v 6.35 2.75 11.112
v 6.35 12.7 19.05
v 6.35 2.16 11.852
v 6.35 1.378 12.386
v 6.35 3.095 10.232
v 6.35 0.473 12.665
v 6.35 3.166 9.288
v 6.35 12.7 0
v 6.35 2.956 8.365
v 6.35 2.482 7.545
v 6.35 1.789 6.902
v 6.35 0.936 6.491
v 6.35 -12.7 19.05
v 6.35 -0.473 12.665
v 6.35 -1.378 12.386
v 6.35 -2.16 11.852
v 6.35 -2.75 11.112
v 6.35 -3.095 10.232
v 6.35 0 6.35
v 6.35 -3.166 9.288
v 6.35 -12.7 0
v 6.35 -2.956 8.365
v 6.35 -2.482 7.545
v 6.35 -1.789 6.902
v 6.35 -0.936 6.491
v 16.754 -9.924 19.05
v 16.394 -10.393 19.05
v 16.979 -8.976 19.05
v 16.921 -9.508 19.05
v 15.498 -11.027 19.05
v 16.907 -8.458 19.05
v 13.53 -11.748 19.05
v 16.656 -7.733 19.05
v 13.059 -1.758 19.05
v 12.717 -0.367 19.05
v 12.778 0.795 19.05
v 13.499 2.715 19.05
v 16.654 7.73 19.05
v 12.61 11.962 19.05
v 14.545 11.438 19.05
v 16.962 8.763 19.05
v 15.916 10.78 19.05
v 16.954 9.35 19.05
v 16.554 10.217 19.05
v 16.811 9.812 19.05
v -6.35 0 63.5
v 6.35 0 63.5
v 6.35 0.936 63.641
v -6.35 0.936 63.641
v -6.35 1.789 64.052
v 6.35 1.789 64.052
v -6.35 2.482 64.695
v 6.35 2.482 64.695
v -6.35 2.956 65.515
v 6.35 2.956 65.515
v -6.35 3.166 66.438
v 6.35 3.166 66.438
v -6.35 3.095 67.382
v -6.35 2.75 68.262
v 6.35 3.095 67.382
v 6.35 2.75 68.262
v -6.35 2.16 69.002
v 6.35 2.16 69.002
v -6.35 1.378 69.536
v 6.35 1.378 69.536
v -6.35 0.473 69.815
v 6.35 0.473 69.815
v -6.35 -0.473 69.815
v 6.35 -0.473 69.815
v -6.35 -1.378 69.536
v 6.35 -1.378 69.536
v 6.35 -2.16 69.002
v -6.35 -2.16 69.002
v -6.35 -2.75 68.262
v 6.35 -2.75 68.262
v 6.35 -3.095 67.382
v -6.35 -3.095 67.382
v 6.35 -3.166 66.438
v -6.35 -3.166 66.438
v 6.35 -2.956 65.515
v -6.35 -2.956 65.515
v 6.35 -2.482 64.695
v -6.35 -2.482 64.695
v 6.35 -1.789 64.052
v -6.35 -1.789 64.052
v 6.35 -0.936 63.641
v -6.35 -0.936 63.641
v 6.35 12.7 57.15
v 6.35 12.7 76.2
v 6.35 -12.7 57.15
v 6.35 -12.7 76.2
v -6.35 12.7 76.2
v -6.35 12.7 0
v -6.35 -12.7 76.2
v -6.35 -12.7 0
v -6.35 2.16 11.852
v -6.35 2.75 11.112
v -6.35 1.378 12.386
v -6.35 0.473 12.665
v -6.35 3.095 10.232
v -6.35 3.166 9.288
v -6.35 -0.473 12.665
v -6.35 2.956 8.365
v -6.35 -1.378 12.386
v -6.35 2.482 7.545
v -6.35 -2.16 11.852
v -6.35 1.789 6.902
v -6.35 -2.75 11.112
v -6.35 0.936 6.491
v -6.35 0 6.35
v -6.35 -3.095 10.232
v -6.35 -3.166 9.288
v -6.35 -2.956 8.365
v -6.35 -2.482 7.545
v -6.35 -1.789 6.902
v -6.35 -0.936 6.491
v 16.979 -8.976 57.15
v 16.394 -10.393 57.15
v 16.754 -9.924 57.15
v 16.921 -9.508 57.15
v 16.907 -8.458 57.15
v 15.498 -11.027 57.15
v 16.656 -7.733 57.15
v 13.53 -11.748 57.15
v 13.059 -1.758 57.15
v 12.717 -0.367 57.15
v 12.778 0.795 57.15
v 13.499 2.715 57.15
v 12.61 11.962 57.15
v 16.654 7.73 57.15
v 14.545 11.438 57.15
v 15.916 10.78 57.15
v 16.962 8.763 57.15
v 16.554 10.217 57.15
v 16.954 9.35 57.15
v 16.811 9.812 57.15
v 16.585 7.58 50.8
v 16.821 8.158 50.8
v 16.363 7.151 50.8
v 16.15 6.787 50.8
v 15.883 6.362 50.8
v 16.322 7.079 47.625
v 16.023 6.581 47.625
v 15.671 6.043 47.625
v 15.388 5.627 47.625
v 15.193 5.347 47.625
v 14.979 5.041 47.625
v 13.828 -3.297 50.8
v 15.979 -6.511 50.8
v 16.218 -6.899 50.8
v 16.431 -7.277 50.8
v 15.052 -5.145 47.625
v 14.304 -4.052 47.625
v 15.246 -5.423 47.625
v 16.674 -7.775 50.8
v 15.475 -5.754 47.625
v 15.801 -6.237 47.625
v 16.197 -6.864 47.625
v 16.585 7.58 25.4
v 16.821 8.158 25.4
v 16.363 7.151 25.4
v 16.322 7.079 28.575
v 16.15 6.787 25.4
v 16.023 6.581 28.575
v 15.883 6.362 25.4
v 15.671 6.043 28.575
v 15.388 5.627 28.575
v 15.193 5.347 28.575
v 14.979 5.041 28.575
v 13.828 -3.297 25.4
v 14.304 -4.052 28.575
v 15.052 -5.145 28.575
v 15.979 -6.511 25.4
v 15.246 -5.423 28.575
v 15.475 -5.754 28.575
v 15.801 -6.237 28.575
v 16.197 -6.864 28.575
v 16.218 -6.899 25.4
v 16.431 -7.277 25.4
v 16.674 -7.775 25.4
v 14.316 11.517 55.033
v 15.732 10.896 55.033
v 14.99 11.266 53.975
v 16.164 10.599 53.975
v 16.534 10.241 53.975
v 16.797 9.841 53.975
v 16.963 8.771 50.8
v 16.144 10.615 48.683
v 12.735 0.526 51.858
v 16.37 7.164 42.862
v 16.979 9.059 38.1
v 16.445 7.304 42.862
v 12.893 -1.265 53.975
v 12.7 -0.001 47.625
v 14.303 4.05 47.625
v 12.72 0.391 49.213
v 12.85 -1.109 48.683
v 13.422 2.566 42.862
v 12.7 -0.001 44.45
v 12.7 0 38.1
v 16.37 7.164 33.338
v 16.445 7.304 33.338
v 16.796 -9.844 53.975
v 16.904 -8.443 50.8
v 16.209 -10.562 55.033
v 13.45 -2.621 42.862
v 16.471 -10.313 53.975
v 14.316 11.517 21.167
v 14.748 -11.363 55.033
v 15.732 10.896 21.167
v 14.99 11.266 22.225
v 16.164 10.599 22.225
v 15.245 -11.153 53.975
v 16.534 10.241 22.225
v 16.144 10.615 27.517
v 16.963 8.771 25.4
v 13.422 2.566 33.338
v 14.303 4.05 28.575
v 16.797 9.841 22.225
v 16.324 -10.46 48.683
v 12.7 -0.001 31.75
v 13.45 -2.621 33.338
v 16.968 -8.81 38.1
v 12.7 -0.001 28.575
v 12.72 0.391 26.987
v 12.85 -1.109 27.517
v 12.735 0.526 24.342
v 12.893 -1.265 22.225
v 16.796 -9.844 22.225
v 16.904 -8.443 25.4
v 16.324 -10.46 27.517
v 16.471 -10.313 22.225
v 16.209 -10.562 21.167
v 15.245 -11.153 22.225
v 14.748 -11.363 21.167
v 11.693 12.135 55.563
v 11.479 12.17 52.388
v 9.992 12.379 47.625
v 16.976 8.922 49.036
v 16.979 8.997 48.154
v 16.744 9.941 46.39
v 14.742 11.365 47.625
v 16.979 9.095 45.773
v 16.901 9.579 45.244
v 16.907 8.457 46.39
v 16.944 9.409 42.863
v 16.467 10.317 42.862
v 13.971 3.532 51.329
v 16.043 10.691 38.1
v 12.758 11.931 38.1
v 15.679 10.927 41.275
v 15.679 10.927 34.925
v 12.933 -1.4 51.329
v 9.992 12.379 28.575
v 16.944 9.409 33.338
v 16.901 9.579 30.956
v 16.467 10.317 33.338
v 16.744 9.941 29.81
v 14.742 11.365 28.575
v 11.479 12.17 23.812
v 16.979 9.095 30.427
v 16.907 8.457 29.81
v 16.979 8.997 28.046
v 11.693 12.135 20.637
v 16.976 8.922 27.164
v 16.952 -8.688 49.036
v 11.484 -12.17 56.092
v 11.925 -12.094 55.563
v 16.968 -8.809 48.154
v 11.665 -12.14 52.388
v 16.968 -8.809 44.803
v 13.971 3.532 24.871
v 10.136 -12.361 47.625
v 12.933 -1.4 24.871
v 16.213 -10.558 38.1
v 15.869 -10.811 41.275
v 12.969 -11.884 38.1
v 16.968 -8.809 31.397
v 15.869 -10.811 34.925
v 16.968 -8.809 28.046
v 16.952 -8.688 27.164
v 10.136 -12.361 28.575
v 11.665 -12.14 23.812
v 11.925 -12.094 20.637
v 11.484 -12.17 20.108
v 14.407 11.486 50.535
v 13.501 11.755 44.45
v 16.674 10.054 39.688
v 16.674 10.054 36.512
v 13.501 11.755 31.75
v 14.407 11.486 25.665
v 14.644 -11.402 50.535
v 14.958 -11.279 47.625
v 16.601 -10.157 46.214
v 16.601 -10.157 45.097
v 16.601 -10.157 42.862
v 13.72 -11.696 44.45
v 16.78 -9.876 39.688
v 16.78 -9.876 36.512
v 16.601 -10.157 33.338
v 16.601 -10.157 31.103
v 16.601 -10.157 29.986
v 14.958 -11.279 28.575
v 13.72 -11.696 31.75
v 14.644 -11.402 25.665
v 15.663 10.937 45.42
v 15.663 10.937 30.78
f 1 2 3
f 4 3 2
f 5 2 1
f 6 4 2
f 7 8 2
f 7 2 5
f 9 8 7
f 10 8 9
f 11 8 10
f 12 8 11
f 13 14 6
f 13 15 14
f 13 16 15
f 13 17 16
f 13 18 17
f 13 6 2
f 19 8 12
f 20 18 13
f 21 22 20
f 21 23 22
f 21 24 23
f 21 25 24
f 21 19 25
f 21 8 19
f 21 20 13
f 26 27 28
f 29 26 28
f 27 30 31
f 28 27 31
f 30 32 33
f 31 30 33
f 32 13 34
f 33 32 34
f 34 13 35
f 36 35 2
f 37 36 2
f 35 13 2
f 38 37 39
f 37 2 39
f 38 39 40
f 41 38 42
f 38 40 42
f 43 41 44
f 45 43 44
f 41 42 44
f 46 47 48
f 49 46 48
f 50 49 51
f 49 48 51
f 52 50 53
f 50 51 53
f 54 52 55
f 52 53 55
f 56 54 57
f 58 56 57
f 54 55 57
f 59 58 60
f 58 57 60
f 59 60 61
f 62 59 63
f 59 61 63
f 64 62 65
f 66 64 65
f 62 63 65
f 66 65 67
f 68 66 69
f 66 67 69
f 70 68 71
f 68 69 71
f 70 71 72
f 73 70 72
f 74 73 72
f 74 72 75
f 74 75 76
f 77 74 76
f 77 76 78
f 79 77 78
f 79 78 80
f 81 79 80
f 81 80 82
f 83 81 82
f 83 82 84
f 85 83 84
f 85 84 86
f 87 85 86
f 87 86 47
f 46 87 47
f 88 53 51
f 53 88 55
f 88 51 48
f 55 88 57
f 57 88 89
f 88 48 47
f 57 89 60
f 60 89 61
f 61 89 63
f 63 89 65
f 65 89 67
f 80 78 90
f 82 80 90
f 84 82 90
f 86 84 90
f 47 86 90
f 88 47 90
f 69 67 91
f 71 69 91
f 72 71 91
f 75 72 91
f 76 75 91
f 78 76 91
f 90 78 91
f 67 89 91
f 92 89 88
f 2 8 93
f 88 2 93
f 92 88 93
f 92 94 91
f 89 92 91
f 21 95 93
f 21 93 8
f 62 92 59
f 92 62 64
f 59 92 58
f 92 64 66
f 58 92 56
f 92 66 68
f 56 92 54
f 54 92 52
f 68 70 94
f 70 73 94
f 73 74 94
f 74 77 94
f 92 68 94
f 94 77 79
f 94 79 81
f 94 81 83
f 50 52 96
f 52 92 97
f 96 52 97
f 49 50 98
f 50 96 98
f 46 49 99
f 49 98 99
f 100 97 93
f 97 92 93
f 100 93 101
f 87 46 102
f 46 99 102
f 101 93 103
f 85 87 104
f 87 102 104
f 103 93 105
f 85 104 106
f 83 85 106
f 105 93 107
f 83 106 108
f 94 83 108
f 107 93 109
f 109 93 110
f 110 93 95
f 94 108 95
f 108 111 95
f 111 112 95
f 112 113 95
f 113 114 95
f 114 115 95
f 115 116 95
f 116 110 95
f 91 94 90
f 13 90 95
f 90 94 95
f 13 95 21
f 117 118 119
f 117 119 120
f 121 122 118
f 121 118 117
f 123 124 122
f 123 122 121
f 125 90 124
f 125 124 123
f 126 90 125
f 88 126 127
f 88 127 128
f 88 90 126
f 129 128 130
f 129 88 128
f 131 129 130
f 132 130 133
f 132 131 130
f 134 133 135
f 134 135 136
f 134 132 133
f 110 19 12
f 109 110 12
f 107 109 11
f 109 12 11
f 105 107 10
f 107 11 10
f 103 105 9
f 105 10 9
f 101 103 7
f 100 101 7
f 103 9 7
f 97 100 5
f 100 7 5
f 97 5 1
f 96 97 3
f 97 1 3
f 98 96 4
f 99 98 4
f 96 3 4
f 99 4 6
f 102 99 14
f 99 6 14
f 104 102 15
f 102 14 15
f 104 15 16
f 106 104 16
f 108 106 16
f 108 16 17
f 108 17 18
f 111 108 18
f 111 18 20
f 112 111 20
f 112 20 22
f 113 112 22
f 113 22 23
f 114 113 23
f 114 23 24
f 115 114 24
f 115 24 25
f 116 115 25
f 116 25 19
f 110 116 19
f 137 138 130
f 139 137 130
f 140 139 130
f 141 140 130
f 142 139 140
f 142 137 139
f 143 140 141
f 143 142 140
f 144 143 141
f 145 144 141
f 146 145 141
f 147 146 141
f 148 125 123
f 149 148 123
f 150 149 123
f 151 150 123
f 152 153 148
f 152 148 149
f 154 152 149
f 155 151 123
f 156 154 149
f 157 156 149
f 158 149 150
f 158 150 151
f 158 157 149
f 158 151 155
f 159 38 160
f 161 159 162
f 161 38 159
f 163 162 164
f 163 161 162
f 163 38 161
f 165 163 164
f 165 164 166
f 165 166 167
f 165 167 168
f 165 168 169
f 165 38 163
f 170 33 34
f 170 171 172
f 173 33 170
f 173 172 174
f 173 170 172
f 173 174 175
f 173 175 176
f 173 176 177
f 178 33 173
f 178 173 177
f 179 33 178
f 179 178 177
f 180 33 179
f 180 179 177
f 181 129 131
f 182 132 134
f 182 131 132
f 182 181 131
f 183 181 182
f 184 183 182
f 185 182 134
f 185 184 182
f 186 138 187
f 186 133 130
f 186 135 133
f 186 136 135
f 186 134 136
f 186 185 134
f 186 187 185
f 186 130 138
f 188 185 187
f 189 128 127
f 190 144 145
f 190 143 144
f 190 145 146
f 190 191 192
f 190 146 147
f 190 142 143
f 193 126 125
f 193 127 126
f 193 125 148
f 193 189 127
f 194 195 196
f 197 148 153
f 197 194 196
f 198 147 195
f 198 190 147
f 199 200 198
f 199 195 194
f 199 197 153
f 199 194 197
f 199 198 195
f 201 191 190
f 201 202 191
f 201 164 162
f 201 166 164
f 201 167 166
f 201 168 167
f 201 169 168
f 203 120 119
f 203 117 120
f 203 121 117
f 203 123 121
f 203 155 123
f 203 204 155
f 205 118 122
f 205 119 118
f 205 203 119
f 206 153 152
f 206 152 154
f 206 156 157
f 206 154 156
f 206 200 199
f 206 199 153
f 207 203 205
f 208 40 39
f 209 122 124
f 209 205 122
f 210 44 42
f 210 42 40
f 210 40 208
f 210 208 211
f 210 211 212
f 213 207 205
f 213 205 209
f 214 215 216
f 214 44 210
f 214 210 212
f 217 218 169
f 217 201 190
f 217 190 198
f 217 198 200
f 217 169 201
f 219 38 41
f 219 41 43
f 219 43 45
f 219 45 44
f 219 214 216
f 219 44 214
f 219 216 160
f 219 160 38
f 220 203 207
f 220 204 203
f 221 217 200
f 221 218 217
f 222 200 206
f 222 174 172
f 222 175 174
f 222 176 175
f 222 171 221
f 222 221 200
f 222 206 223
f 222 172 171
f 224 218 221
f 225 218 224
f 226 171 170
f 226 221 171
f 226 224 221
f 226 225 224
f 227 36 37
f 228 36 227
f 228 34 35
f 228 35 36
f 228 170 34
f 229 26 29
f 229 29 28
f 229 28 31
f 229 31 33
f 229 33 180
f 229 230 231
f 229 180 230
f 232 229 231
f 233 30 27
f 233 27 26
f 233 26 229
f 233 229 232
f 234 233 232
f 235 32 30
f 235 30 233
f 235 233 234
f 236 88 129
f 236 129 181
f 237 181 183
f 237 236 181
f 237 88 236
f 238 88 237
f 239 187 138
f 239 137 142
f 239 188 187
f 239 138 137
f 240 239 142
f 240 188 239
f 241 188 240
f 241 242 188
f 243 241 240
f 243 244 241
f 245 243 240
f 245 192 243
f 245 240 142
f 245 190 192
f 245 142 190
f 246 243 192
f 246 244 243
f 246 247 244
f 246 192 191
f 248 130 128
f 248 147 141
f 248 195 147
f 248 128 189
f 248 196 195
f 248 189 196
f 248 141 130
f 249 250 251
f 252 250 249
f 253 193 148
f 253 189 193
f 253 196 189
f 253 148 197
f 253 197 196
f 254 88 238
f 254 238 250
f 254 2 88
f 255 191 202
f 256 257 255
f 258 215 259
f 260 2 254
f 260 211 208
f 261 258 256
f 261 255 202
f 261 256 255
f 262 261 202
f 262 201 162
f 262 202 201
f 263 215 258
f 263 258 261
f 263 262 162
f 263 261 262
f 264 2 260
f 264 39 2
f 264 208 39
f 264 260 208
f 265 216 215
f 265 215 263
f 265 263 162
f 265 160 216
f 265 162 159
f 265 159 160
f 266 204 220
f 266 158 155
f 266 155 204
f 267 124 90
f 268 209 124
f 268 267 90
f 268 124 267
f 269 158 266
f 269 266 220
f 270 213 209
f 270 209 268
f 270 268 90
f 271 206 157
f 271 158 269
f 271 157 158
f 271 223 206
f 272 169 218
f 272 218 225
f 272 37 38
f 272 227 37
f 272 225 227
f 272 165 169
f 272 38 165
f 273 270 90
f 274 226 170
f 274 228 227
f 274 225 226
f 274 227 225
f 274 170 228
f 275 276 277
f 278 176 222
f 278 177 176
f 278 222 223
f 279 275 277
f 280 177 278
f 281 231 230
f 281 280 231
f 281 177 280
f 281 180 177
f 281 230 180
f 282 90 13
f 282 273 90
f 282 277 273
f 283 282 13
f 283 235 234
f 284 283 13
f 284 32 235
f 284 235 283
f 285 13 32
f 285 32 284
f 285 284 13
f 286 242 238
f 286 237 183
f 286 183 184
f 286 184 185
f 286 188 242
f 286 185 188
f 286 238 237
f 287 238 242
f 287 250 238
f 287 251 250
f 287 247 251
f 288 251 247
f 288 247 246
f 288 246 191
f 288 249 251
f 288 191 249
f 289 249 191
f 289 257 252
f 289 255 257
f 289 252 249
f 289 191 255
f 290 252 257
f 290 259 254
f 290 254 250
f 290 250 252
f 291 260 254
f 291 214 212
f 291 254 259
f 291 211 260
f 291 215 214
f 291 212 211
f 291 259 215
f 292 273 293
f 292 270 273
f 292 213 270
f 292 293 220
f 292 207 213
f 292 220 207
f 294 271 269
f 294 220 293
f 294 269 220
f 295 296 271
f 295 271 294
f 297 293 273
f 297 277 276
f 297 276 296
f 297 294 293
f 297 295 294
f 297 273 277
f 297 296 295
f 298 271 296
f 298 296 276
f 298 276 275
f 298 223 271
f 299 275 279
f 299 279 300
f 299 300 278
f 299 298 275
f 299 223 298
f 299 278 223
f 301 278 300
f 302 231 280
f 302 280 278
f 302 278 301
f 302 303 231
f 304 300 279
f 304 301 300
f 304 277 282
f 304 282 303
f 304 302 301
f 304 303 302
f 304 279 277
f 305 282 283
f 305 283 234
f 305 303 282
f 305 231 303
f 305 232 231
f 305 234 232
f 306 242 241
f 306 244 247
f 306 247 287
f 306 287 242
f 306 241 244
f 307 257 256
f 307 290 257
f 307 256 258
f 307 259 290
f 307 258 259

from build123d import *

# Parameters (mm, degrees)
BOSS_EXTRUDE1_DEPTH = 76.2
CUT_EXTRUDE1_DEPTH  = 19.05
CUT_EXTRUDE2_DEPTH  = 19.05
SKETCH4_R           = 3.175
CUT_EXTRUDE3_DEPTH  = 13.7


with BuildPart() as part:
    # Sketch1 → Boss-Extrude1 (new body)
    with BuildSketch(Plane.XY):
        with BuildLine():
            Line((-6.35, -12.7), (6.35, -12.7))
            add(Edge.make_bspline(
                [(6.35, 12.7), (25.715251748, 11.504486328), (-0.315251748, 0), (25.715251748, -11.504486328), (6.35, -12.7)],
                knots=[0, 0, 0, 0, 0.5, 1, 1, 1, 1], degree=3))
            Line((6.35, 12.7), (-6.35, 12.7))
            Line((-6.35, 12.7), (-6.35, -12.7))
        make_face()
    extrude(amount=BOSS_EXTRUDE1_DEPTH)

    # Sketch2 → Cut-Extrude1 (cut)
    with BuildSketch(Plane.XY.offset(76.2)):
        with BuildLine():
            Line((6.35, 12.7), (6.35, -12.7))
            add(Edge.make_bspline(
                [(6.35, -12.7), (25.715251748, -11.504486328), (-0.315251748, 0), (25.715251748, 11.504486328), (6.35, 12.7)],
                knots=[0, 0, 0, 0, 0.5, 1, 1, 1, 1], degree=3))
        make_face()
    extrude(amount=-CUT_EXTRUDE1_DEPTH, mode=Mode.SUBTRACT)

    # Sketch3 → Cut-Extrude2 (cut)
    with BuildSketch(Plane(origin=(0, 0, 0), x_dir=(-1, 0, 0), z_dir=(0, 0, -1))):
        with BuildLine():
            Line((-6.35, 12.7), (-6.35, -12.7))
            add(Edge.make_bspline(
                [(-6.35, -12.7), (-25.715251748, -11.504486328), (0.315251748, 0), (-25.715251748, 11.504486328), (-6.35, 12.7)],
                knots=[0, 0, 0, 0, 0.5, 1, 1, 1, 1], degree=3))
        make_face()
    extrude(amount=-CUT_EXTRUDE2_DEPTH, mode=Mode.SUBTRACT)

    # Sketch4 → Cut-Extrude3 (cut, through all)
    with BuildSketch(Plane(origin=(6.35, 0, 0), x_dir=(0, 0, -1), z_dir=(1, 0, 0))):
        with Locations((-66.675, 0)):
            Circle(SKETCH4_R)
        with Locations((-9.525, 0)):
            Circle(SKETCH4_R)
    extrude(amount=-CUT_EXTRUDE3_DEPTH, mode=Mode.SUBTRACT)


solid = part.part
